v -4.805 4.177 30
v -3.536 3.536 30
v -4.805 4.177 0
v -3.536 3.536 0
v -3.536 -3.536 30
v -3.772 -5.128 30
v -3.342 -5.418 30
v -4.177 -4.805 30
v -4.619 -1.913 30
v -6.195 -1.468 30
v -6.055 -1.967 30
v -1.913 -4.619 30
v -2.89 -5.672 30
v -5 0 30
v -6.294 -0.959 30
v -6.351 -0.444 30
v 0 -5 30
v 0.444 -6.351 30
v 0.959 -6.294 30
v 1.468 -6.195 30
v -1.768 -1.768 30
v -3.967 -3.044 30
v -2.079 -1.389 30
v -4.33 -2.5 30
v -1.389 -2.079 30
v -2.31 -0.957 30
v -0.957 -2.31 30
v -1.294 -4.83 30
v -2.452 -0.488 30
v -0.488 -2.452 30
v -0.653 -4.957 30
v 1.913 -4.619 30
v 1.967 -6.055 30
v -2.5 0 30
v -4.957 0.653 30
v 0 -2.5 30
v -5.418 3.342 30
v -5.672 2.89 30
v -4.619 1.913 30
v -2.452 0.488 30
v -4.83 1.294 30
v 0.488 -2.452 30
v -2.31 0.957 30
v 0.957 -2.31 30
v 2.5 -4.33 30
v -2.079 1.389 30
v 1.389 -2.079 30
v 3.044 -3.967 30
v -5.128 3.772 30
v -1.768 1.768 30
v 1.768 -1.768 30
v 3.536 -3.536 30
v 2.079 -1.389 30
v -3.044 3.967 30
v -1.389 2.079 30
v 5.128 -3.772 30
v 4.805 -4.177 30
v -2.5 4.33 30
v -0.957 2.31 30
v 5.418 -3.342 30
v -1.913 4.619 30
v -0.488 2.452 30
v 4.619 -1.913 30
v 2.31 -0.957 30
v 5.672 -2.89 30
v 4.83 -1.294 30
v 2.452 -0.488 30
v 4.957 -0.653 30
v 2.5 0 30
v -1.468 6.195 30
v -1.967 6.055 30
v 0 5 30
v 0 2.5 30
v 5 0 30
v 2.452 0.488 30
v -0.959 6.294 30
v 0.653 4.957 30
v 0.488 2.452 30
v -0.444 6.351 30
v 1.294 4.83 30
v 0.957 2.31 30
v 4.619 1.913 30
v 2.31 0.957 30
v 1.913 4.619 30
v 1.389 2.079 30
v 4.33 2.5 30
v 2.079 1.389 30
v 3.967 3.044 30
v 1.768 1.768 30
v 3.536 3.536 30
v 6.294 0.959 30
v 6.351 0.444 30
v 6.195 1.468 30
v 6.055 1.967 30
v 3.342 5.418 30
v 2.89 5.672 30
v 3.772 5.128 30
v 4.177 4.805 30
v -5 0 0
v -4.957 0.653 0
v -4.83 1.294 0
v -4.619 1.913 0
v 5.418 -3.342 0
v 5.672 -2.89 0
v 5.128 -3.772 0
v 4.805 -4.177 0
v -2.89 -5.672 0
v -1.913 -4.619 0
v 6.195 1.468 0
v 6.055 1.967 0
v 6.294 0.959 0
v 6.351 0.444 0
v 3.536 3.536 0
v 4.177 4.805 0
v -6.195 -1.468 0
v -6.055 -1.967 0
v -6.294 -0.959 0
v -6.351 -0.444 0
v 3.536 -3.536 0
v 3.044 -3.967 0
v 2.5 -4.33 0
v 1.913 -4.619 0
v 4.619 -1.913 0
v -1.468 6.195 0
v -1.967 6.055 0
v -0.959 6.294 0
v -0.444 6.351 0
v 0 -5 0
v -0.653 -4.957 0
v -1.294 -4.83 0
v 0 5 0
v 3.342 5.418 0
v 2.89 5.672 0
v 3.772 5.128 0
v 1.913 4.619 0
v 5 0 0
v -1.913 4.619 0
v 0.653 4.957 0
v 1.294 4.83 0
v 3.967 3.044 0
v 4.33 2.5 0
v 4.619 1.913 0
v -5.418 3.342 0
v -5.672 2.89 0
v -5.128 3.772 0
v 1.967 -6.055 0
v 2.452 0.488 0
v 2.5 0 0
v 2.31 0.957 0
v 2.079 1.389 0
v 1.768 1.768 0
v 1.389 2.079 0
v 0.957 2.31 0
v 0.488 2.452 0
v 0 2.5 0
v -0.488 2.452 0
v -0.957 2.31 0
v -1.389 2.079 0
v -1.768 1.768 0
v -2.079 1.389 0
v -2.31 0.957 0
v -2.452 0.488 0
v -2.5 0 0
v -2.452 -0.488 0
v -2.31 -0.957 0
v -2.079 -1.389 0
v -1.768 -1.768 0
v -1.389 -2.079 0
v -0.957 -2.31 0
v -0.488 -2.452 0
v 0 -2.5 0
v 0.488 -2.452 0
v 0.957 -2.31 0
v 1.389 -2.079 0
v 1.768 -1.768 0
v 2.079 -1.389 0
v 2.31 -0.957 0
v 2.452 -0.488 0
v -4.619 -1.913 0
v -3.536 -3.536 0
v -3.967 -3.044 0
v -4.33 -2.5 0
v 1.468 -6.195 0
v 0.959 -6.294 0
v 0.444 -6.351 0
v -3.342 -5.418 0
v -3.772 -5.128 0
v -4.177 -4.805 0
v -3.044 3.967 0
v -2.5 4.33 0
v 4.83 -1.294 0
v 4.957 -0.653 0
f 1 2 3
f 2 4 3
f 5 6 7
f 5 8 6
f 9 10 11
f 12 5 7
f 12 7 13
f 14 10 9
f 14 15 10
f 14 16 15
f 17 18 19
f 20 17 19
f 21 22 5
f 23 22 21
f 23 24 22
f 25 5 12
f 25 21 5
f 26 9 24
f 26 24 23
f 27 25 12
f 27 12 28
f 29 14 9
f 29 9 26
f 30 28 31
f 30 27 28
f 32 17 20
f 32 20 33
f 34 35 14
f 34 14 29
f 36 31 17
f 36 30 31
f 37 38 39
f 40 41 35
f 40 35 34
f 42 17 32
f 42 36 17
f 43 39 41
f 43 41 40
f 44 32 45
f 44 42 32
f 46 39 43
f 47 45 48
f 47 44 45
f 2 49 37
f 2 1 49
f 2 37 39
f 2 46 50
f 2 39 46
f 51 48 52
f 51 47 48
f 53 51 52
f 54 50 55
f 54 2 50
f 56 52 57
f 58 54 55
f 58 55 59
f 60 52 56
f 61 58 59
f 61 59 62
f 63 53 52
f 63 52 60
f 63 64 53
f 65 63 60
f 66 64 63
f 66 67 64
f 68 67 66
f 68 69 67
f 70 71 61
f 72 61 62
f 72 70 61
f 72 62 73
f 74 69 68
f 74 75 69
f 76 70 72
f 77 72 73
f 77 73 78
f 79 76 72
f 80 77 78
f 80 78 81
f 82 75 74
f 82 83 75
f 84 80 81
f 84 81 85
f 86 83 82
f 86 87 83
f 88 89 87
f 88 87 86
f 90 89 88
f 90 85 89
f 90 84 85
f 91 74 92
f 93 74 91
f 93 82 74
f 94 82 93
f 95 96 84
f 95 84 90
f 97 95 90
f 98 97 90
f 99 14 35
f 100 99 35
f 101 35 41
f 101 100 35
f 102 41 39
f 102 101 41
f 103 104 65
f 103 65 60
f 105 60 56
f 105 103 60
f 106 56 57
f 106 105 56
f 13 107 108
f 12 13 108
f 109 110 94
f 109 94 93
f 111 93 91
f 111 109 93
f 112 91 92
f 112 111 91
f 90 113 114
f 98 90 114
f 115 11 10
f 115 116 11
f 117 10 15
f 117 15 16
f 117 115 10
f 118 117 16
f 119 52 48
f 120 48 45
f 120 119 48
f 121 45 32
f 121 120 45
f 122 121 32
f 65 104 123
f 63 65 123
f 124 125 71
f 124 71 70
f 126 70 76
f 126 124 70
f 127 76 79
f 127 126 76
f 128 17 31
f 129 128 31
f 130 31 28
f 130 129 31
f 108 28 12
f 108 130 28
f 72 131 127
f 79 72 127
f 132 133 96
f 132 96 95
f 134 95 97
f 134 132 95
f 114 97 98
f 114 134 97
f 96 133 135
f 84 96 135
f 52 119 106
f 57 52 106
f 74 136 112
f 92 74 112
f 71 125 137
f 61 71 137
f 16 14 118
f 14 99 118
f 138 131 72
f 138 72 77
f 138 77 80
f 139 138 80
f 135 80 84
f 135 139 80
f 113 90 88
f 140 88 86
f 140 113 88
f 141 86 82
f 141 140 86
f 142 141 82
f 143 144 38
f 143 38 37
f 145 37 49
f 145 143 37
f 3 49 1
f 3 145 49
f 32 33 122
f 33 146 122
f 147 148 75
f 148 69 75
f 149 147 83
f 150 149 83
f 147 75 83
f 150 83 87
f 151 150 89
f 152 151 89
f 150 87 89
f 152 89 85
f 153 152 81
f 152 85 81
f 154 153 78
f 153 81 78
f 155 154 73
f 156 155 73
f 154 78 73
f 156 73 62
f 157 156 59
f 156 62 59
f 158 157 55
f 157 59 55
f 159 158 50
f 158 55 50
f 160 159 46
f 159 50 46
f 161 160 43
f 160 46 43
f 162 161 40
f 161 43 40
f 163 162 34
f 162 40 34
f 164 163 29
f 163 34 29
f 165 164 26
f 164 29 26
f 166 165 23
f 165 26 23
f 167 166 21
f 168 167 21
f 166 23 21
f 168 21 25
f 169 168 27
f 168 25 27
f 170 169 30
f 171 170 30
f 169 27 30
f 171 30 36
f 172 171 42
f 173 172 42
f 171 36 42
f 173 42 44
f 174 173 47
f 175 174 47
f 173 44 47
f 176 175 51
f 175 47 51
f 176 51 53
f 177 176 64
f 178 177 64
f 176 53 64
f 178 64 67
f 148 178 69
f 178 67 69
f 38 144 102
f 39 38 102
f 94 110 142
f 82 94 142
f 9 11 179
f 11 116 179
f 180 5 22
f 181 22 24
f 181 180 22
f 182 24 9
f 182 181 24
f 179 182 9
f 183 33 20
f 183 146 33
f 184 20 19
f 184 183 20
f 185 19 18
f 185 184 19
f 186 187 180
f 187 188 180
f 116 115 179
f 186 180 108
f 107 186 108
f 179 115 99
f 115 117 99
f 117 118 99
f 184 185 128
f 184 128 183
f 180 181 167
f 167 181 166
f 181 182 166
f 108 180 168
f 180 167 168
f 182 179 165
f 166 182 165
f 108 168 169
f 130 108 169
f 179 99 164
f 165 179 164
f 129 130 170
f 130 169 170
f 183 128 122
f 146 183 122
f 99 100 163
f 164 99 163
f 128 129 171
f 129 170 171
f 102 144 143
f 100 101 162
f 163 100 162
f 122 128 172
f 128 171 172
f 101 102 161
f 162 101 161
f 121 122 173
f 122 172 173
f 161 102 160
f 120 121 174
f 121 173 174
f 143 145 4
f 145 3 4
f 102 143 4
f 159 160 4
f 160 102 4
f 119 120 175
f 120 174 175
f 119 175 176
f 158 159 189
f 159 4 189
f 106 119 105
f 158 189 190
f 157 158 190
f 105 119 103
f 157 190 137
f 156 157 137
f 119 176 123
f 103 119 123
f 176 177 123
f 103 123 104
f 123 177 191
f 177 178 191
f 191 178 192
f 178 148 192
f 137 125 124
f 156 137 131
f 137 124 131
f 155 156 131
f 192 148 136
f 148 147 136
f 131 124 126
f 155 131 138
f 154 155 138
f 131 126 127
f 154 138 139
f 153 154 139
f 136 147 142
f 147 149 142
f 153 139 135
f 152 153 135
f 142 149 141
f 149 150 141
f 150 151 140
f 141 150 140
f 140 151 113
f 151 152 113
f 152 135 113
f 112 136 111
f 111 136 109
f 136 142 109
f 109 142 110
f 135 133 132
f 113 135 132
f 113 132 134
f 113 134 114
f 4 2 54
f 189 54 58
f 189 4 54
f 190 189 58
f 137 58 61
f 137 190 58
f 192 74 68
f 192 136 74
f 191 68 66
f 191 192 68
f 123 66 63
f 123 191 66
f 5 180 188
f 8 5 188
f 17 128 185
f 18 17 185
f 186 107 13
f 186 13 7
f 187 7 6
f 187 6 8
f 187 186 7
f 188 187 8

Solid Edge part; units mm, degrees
sketch "Sketch1" plane through (0, 0, 0) normal (0, 0, 1) x (1, 0, 0)
  line L0 (5, 0) -> (6.3507, 0.4441)
  arc A0 (6.0546, 1.9673) -> (6.3507, 0.4441) centre (0, 0) cw
  line L1 (6.0546, 1.9673) -> (4.6194, 1.9134)
  arc A1 (3.5355, 3.5355) -> (4.6194, 1.9134) centre (0, 0) cw
  line L2 (3.5355, 3.5355) -> (4.1766, 4.8046)
  arc A2 (2.8902, 5.6723) -> (4.1766, 4.8046) centre (0, 0) cw
  line L3 (2.8902, 5.6723) -> (1.9134, 4.6194)
  arc A3 (0, 5) -> (1.9134, 4.6194) centre (0, 0) cw
  line L4 (0, 5) -> (-0.4441, 6.3507)
  arc A4 (-1.9673, 6.0546) -> (-0.4441, 6.3507) centre (0, 0) cw
  line L5 (-1.9673, 6.0546) -> (-1.9134, 4.6194)
  arc A5 (-3.5355, 3.5355) -> (-1.9134, 4.6194) centre (0, 0) cw
  line L6 (-3.5355, 3.5355) -> (-4.8046, 4.1766)
  arc A6 (-5.6723, 2.8902) -> (-4.8046, 4.1766) centre (0, 0) cw
  line L7 (-5.6723, 2.8902) -> (-4.6194, 1.9134)
  arc A7 (-5, 0) -> (-4.6194, 1.9134) centre (0, 0) cw
  line L8 (-5, 0) -> (-6.3507, -0.4441)
  arc A8 (-6.0546, -1.9673) -> (-6.3507, -0.4441) centre (0, 0) cw
  line L9 (-6.0546, -1.9673) -> (-4.6194, -1.9134)
  arc A9 (-3.5355, -3.5355) -> (-4.6194, -1.9134) centre (0, 0) cw
  line L10 (-3.5355, -3.5355) -> (-4.1766, -4.8046)
  arc A10 (-2.8902, -5.6723) -> (-4.1766, -4.8046) centre (0, 0) cw
  line L11 (-2.8902, -5.6723) -> (-1.9134, -4.6194)
  arc A11 (0, -5) -> (-1.9134, -4.6194) centre (0, 0) cw
  line L12 (0, -5) -> (0.4441, -6.3507)
  arc A12 (1.9673, -6.0546) -> (0.4441, -6.3507) centre (0, 0) cw
  line L13 (1.9673, -6.0546) -> (1.9134, -4.6194)
  arc A13 (3.5355, -3.5355) -> (1.9134, -4.6194) centre (0, 0) cw
  line L14 (3.5355, -3.5355) -> (4.8046, -4.1766)
  arc A14 (5.6723, -2.8902) -> (4.8046, -4.1766) centre (0, 0) cw
  line L15 (5.6723, -2.8902) -> (4.6194, -1.9134)
  arc A15 (5, 0) -> (4.6194, -1.9134) centre (0, 0) cw
extrude "Protrusion1" add sketch "Sketch1" along normal blind 30
sketch "Sketch2" plane through (0, 0, 30) normal (0, 0, 1) x (1, 0, 0)
  circle A0 centre (0, 0) radius 2.5
extrude "Cutout1" cut sketch "Sketch2" against normal through all
